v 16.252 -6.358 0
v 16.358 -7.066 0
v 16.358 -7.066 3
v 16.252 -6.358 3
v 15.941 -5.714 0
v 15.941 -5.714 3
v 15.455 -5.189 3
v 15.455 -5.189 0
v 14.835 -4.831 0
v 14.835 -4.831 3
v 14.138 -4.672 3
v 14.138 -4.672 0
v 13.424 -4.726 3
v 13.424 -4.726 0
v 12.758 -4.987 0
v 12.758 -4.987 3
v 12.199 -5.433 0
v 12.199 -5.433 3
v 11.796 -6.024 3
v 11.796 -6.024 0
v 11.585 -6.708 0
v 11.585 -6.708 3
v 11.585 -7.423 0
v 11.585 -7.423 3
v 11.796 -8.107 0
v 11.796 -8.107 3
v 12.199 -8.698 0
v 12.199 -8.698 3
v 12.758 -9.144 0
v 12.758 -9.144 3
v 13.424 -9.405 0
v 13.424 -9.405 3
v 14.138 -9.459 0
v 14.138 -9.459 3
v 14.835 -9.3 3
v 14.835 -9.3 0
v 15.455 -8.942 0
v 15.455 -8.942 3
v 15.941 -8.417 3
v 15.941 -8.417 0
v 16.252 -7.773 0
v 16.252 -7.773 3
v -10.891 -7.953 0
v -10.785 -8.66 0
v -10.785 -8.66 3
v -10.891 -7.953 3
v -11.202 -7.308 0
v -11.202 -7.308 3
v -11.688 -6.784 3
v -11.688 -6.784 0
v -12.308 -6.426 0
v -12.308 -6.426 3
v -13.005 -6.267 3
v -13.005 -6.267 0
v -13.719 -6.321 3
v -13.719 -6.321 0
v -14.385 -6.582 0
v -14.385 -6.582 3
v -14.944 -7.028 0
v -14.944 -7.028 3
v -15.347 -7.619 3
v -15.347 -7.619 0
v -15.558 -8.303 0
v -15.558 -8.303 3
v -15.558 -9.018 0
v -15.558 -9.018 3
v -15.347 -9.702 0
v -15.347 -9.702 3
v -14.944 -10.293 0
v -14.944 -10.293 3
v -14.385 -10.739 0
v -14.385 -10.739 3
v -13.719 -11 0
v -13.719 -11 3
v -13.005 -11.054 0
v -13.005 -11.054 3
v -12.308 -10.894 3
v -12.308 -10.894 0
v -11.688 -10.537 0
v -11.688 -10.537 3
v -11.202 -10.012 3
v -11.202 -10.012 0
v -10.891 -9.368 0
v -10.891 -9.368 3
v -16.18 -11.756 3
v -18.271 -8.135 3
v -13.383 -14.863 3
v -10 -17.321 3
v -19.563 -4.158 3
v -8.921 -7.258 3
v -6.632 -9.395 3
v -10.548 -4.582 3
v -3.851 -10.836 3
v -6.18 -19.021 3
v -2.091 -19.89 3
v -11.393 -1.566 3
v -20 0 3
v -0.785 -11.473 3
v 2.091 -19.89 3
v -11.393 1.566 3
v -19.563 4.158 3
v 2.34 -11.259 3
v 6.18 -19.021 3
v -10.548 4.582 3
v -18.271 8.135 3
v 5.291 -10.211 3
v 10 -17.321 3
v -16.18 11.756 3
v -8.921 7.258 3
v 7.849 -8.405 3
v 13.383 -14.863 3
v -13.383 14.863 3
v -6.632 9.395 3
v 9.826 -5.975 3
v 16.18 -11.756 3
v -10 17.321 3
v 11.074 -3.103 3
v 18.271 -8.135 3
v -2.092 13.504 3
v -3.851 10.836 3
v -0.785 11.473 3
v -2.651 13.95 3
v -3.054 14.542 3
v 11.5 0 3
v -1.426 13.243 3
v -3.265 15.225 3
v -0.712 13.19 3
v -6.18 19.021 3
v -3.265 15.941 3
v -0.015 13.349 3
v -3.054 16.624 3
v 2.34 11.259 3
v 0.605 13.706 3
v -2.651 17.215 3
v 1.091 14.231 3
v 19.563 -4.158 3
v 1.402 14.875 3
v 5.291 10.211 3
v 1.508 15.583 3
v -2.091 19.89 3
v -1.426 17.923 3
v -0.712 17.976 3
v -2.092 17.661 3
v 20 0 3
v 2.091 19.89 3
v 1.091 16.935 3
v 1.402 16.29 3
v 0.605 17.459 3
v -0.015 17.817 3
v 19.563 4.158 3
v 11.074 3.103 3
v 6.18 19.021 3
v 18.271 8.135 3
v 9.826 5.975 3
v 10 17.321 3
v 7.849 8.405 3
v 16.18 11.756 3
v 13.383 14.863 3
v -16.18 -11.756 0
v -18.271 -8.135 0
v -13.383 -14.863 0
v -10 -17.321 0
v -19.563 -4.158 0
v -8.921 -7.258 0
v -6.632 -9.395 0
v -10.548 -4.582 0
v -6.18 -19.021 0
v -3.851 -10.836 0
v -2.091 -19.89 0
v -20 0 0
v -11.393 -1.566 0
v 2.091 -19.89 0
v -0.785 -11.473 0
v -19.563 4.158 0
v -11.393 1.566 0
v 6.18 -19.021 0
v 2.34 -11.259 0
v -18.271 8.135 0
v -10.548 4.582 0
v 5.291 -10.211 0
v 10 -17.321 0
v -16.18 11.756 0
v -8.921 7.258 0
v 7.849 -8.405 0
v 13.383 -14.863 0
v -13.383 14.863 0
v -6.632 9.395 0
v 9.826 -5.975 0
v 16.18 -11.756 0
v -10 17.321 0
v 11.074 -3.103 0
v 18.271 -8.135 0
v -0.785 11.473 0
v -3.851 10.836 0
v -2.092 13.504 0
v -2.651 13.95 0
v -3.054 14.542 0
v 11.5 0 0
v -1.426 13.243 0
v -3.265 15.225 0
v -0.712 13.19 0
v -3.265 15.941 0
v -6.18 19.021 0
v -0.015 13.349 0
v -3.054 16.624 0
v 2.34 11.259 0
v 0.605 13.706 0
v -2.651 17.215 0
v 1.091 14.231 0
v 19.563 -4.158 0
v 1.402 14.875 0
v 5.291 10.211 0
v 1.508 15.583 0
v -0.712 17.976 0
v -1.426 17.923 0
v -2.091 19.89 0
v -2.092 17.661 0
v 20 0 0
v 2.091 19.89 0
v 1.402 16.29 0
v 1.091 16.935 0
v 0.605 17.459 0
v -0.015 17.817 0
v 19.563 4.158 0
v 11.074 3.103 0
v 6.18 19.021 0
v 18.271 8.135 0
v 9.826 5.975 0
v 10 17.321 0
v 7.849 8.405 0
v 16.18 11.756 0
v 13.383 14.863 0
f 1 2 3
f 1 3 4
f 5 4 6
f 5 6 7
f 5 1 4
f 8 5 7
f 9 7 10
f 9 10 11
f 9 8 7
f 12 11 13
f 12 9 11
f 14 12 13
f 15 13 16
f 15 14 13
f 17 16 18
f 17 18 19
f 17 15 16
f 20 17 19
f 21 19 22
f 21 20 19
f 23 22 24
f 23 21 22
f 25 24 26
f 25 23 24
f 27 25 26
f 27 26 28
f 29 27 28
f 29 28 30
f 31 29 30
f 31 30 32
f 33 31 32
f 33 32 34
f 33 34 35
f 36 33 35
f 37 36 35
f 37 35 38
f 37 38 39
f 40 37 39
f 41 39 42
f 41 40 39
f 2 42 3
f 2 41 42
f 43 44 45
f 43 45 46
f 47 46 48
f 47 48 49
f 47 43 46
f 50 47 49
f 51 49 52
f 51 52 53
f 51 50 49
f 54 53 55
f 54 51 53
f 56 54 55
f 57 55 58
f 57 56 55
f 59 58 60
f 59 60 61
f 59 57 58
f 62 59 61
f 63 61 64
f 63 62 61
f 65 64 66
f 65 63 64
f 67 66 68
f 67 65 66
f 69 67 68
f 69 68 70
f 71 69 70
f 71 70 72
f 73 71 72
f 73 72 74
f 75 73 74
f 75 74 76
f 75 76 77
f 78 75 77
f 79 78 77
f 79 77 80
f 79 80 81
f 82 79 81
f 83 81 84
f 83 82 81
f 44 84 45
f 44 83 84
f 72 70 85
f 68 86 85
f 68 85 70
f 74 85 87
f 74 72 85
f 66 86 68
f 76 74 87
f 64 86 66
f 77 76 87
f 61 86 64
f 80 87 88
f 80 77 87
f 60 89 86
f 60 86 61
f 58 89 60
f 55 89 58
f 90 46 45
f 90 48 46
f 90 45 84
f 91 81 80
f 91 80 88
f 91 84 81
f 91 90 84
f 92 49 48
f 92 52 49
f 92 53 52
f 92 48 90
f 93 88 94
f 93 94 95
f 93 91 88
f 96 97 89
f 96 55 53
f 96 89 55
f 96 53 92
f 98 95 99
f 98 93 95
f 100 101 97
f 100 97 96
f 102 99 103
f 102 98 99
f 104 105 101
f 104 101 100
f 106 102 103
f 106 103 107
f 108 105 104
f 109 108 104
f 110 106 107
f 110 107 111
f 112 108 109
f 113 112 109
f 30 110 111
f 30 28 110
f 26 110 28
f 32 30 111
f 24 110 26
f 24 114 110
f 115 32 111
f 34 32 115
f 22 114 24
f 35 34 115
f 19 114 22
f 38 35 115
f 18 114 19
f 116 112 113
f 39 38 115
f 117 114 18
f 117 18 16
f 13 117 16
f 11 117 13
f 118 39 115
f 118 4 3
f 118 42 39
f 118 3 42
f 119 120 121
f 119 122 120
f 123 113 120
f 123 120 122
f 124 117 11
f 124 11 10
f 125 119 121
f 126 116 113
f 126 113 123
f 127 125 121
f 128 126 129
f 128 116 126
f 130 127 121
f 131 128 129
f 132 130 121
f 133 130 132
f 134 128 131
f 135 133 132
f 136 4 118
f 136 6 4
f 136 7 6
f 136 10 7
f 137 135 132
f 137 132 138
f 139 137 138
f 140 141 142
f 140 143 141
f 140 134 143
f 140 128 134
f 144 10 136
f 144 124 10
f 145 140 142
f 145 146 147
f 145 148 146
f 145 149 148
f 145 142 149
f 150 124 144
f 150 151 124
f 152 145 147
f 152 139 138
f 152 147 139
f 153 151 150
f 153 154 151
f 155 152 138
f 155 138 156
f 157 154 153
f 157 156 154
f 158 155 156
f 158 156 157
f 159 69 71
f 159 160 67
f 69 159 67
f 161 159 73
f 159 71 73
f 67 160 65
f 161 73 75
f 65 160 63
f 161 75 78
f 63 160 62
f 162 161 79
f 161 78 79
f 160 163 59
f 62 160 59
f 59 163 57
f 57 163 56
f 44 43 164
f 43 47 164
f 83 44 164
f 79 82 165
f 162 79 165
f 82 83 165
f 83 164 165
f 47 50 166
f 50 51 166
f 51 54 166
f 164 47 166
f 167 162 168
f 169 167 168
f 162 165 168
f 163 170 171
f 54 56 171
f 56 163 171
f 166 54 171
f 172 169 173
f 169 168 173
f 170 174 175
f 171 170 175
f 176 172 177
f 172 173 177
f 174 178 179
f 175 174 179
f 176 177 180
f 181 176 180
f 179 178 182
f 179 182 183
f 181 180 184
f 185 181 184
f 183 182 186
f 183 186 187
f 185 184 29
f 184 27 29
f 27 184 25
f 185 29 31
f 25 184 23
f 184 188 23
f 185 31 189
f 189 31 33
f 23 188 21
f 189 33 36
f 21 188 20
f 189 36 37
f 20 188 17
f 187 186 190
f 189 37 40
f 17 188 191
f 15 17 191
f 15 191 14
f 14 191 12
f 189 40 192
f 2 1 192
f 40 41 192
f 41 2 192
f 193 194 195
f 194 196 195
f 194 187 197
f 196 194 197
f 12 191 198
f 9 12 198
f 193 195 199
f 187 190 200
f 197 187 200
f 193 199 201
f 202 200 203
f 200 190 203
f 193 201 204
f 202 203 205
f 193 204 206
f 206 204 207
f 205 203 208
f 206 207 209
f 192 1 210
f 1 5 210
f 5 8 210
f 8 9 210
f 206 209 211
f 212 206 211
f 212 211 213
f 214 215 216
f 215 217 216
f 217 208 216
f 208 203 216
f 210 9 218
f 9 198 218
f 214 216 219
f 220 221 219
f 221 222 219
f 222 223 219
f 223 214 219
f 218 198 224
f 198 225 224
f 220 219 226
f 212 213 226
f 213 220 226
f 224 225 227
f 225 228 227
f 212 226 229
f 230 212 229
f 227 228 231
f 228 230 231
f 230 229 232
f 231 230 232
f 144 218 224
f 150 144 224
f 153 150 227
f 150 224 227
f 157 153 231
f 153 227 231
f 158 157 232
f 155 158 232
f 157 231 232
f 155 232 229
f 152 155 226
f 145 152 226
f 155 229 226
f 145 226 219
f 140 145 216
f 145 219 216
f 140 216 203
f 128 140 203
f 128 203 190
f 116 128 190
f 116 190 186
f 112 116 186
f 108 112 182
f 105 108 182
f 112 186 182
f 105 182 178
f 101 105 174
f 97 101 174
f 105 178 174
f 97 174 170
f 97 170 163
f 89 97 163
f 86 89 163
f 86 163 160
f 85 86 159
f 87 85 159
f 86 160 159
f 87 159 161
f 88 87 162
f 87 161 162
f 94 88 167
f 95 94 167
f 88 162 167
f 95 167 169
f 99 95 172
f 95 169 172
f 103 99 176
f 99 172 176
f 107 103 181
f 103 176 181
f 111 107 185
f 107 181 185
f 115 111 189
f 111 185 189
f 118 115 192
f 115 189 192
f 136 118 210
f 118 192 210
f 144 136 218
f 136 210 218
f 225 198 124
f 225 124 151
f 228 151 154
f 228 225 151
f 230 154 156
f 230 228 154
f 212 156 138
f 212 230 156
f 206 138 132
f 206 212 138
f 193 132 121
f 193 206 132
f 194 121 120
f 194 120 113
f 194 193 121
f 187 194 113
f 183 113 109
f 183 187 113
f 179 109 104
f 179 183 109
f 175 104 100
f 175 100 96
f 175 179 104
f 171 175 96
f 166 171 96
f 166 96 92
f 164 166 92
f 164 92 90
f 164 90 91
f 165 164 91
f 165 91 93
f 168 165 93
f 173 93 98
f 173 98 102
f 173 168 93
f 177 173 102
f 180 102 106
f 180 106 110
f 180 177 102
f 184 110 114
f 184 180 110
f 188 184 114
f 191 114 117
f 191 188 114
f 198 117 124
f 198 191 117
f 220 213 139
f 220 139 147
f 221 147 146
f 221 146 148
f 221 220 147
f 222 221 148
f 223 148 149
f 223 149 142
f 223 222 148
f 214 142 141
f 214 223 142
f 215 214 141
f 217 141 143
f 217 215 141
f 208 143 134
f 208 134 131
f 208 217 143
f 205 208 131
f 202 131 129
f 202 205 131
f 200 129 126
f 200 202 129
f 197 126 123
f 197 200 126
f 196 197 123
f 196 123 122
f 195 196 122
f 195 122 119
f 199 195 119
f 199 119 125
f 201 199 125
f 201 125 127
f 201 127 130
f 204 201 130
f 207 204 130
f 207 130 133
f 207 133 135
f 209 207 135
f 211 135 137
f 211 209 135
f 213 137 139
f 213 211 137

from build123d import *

# Parameters (mm, degrees)
SKETCH2_R           = 20
SKETCH2_R_2         = 2.4
SKETCH2_R_3         = 11.5
BOSS_EXTRUDE1_DEPTH = 3


with BuildPart() as part:
    # Sketch2 → Boss-Extrude1 (new body)
    with BuildSketch(Plane.XY):
        Circle(SKETCH2_R)
        with Locations((-13.184775653, -8.660341037)):
            Circle(SKETCH2_R_2, mode=Mode.SUBTRACT)
        with Locations((13.958150794, -7.065513271)):
            Circle(SKETCH2_R_2, mode=Mode.SUBTRACT)
        Circle(SKETCH2_R_3, mode=Mode.SUBTRACT)
        with Locations((-0.89182915, 15.582825039)):
            Circle(SKETCH2_R_2, mode=Mode.SUBTRACT)
    extrude(amount=BOSS_EXTRUDE1_DEPTH)


solid = part.part
